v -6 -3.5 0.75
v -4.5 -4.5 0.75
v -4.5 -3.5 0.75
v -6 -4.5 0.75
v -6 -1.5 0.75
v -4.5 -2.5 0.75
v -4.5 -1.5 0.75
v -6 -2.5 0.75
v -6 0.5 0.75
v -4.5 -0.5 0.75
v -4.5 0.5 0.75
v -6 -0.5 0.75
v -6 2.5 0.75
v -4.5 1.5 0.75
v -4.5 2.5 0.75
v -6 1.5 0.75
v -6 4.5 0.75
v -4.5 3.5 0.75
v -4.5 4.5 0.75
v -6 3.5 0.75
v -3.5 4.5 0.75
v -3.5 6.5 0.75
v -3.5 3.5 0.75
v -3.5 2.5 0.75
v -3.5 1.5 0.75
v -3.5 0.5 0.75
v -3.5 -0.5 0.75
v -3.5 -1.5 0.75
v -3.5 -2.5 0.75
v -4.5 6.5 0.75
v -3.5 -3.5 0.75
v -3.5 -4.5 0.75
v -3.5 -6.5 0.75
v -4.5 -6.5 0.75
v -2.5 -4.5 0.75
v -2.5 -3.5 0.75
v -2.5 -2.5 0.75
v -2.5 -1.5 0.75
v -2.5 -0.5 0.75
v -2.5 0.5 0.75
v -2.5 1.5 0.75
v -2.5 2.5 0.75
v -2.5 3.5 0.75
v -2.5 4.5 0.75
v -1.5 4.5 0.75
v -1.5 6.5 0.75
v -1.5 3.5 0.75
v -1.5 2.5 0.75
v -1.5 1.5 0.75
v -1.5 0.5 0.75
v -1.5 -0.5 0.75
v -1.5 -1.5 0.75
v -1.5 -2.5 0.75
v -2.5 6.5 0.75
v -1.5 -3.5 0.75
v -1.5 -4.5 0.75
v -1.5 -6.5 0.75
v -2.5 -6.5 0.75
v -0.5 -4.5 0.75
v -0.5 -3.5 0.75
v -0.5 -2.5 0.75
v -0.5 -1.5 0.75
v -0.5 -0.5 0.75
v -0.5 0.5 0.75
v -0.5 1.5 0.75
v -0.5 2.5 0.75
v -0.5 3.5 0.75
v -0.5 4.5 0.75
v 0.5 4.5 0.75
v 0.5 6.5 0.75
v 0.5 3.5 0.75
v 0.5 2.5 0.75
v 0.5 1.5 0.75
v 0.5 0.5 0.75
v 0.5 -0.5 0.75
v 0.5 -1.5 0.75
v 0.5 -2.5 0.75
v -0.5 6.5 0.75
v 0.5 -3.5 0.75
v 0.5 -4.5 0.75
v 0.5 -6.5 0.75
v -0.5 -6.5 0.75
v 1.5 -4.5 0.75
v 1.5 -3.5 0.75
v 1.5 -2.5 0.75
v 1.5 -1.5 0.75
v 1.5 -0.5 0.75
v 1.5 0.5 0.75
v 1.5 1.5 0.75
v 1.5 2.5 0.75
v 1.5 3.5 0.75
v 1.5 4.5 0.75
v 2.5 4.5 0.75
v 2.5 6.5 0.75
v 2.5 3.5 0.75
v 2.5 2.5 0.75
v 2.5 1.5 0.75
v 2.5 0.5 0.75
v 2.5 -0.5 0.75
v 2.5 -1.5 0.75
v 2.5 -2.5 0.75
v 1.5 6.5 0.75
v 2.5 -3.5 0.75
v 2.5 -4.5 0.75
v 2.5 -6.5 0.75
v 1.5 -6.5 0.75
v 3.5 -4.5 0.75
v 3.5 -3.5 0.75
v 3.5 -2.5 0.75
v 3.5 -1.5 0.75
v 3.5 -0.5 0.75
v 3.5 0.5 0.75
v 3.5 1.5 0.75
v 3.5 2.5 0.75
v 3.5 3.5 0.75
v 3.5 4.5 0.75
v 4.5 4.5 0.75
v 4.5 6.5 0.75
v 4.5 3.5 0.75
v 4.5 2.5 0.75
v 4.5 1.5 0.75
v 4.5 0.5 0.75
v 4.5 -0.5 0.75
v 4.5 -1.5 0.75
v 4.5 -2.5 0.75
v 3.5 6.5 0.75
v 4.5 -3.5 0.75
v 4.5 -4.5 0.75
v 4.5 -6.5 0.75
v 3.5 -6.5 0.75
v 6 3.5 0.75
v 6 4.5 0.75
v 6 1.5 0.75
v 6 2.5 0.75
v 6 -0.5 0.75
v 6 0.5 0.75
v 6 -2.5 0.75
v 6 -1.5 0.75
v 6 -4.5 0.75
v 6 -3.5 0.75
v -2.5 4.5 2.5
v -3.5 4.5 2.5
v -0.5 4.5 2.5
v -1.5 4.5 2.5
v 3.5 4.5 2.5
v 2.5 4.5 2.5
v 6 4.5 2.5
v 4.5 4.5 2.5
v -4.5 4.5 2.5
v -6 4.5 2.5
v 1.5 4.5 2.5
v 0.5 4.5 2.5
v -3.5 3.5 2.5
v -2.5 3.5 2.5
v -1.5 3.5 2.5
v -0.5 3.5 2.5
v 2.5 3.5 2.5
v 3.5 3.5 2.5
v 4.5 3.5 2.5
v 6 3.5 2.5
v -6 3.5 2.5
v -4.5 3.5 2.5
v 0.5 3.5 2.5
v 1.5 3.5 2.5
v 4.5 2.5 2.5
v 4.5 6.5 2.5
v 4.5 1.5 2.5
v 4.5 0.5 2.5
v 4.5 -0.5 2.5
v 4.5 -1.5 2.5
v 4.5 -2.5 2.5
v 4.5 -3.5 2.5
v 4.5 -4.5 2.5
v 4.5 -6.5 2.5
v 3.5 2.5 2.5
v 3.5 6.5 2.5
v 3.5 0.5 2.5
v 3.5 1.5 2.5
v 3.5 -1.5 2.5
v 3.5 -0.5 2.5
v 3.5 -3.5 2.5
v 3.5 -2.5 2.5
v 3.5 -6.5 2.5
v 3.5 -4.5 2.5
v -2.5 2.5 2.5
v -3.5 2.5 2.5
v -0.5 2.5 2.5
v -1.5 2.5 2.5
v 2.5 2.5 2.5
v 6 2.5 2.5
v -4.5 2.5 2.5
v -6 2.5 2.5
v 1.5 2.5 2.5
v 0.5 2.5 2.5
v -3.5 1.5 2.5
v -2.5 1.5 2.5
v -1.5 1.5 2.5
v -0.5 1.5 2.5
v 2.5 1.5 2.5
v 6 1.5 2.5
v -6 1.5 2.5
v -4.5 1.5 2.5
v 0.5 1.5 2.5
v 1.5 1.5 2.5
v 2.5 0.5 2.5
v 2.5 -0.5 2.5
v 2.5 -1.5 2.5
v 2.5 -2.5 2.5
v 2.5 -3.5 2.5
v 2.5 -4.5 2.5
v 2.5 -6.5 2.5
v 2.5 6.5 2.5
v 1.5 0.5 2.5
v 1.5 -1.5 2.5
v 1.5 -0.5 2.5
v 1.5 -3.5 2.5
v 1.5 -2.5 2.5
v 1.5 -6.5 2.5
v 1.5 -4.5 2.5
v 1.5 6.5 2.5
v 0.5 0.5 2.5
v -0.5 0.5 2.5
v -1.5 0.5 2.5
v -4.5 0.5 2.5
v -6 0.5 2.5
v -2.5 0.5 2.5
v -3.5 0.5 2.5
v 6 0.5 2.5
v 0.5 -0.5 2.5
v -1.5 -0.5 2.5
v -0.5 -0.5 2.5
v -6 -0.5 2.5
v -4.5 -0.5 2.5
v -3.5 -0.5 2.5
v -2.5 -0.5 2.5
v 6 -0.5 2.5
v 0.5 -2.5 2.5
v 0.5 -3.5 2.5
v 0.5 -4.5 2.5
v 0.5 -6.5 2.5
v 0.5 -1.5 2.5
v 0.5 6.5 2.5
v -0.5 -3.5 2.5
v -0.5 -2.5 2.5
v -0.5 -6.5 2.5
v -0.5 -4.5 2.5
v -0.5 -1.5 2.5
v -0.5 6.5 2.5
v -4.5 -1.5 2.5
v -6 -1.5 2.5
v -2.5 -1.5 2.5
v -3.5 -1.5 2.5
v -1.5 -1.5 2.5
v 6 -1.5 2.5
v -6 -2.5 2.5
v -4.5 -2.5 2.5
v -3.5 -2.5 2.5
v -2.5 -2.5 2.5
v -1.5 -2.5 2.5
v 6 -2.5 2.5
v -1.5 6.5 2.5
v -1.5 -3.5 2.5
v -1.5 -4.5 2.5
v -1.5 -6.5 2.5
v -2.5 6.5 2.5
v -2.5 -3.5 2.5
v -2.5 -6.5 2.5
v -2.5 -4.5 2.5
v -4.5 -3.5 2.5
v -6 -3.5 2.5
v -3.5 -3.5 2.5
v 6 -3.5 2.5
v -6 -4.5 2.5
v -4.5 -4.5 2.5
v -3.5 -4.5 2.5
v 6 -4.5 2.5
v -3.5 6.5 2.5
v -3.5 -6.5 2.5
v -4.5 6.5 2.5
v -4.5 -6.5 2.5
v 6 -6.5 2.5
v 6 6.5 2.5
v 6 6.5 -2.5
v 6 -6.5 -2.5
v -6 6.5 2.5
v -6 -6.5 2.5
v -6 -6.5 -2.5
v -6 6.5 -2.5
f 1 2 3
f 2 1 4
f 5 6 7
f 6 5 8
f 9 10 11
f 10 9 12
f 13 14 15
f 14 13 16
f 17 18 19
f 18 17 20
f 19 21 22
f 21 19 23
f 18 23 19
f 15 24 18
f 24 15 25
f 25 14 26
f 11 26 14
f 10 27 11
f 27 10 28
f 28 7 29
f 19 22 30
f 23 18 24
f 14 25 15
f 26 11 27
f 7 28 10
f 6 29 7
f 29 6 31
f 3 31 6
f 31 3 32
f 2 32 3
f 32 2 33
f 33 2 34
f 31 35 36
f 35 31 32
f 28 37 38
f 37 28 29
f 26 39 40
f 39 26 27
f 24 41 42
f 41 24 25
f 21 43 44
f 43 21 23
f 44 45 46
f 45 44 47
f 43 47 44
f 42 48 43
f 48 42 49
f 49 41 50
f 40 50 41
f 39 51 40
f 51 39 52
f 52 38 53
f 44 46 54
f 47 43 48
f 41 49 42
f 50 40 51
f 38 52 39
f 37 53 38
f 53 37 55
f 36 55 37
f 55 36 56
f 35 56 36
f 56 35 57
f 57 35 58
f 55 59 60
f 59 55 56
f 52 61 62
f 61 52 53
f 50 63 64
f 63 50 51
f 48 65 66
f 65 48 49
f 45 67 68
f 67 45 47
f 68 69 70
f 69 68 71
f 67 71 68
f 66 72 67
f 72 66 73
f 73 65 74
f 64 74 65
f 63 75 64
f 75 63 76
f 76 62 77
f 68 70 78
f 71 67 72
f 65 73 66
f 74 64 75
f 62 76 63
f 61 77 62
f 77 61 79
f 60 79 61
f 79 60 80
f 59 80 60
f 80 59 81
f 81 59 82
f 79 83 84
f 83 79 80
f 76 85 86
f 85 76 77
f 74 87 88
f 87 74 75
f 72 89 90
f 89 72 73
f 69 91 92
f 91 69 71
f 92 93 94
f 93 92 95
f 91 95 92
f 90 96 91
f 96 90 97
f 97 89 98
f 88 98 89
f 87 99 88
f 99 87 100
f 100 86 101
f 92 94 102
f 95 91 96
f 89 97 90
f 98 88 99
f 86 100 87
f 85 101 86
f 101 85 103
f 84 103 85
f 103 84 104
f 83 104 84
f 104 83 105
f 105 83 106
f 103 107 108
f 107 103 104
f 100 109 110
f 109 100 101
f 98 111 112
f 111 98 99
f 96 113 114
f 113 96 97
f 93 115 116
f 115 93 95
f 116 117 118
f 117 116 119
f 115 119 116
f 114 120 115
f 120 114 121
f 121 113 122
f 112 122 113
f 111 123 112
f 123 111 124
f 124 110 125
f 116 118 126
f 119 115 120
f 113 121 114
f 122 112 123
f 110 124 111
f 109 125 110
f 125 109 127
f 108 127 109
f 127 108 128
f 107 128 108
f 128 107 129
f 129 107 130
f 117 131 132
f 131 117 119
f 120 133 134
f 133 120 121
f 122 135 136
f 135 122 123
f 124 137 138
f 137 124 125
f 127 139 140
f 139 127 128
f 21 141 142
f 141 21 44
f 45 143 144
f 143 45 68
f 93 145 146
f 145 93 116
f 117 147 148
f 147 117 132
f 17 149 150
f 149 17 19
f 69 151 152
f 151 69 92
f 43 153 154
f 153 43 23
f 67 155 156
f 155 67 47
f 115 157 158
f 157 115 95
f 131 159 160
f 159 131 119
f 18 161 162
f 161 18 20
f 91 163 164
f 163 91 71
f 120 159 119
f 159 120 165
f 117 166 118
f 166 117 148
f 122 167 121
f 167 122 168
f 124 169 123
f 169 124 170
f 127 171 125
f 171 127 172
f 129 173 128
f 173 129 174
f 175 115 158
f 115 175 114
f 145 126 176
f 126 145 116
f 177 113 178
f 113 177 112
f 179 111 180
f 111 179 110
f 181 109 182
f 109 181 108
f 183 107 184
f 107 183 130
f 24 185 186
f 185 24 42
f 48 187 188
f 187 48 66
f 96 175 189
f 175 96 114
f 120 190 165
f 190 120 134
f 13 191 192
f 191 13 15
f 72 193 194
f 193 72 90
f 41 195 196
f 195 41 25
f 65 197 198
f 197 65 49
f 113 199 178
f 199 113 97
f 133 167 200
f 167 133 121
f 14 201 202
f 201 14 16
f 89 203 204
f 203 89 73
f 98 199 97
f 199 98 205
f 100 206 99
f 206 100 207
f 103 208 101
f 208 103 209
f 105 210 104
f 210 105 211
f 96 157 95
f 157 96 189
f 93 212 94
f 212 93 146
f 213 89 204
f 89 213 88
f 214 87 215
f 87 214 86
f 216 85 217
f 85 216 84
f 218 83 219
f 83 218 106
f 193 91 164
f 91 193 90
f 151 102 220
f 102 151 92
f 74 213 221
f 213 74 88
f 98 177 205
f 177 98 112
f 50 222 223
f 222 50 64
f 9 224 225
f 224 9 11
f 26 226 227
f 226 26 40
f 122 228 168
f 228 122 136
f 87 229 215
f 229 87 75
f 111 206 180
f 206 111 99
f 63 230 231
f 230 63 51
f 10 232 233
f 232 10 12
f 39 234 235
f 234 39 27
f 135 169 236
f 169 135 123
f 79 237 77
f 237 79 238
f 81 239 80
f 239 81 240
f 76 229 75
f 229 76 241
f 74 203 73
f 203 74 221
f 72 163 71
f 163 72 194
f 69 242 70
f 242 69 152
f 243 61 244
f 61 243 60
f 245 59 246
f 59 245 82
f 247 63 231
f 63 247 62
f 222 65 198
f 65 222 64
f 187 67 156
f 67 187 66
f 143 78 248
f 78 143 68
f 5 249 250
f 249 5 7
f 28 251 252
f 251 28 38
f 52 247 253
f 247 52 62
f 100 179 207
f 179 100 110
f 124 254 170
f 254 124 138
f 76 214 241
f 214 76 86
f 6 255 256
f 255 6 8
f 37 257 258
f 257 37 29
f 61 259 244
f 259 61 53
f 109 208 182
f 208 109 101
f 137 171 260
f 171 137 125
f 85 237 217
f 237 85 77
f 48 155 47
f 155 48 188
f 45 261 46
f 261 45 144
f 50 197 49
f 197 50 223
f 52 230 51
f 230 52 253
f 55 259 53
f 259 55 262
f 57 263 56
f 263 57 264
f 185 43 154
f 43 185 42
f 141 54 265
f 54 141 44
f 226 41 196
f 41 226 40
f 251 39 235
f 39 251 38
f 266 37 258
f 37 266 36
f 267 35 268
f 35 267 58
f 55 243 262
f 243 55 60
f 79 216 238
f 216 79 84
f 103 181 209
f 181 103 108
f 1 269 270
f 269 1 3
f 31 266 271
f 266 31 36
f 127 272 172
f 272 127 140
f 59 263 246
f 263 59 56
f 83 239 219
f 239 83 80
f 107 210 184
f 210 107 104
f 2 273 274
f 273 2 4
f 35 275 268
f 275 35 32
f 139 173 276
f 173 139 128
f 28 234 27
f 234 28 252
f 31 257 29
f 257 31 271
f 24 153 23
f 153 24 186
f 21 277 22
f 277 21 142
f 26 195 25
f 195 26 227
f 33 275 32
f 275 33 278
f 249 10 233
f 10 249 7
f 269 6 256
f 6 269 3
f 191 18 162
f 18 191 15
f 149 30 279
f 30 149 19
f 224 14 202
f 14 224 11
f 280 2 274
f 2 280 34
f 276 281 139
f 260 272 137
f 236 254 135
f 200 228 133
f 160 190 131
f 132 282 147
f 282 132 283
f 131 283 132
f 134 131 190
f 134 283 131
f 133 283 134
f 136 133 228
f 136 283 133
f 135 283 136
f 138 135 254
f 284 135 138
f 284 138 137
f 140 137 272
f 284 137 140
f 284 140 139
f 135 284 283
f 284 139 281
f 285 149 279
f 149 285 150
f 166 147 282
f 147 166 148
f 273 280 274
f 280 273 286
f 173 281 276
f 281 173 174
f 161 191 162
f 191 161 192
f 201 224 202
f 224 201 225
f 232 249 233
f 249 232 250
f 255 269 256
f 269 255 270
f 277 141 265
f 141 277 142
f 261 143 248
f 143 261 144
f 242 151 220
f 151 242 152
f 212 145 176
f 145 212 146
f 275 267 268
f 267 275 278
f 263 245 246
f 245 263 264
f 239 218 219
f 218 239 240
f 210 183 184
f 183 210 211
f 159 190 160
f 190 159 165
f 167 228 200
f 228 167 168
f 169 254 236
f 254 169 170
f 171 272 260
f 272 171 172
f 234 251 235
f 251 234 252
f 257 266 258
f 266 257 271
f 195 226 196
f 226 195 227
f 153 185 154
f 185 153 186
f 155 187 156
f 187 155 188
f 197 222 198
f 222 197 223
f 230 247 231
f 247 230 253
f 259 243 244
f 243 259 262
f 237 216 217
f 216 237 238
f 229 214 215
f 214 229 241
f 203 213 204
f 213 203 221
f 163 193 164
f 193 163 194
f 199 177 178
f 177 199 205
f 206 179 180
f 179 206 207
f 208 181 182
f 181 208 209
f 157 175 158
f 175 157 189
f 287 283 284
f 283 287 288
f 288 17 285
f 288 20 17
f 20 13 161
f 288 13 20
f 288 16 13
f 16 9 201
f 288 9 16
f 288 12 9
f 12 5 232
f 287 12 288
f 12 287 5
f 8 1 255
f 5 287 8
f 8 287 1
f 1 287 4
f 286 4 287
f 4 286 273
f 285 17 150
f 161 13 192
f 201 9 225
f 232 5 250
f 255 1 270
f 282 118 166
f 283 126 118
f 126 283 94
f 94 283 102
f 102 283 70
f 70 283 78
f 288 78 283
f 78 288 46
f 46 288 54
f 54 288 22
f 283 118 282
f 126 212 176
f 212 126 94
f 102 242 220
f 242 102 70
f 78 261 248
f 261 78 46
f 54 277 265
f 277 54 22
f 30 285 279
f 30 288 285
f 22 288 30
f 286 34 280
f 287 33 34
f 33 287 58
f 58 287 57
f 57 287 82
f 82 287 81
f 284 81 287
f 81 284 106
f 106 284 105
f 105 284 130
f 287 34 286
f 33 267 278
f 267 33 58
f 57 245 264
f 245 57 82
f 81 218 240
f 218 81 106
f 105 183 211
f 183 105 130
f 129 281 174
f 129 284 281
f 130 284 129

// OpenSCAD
color("#da8a67") difference() {
    cube([12, 13, 5], center=true);


    union() {
        for (i = [-2:2]) {
            translate([0, -2*i, 2]) cube([20, 1, 2.5], center=true);
            translate([-2*i, 0, 2]) cube([1, 20, 2.5], center=true);
        }
    }
}
